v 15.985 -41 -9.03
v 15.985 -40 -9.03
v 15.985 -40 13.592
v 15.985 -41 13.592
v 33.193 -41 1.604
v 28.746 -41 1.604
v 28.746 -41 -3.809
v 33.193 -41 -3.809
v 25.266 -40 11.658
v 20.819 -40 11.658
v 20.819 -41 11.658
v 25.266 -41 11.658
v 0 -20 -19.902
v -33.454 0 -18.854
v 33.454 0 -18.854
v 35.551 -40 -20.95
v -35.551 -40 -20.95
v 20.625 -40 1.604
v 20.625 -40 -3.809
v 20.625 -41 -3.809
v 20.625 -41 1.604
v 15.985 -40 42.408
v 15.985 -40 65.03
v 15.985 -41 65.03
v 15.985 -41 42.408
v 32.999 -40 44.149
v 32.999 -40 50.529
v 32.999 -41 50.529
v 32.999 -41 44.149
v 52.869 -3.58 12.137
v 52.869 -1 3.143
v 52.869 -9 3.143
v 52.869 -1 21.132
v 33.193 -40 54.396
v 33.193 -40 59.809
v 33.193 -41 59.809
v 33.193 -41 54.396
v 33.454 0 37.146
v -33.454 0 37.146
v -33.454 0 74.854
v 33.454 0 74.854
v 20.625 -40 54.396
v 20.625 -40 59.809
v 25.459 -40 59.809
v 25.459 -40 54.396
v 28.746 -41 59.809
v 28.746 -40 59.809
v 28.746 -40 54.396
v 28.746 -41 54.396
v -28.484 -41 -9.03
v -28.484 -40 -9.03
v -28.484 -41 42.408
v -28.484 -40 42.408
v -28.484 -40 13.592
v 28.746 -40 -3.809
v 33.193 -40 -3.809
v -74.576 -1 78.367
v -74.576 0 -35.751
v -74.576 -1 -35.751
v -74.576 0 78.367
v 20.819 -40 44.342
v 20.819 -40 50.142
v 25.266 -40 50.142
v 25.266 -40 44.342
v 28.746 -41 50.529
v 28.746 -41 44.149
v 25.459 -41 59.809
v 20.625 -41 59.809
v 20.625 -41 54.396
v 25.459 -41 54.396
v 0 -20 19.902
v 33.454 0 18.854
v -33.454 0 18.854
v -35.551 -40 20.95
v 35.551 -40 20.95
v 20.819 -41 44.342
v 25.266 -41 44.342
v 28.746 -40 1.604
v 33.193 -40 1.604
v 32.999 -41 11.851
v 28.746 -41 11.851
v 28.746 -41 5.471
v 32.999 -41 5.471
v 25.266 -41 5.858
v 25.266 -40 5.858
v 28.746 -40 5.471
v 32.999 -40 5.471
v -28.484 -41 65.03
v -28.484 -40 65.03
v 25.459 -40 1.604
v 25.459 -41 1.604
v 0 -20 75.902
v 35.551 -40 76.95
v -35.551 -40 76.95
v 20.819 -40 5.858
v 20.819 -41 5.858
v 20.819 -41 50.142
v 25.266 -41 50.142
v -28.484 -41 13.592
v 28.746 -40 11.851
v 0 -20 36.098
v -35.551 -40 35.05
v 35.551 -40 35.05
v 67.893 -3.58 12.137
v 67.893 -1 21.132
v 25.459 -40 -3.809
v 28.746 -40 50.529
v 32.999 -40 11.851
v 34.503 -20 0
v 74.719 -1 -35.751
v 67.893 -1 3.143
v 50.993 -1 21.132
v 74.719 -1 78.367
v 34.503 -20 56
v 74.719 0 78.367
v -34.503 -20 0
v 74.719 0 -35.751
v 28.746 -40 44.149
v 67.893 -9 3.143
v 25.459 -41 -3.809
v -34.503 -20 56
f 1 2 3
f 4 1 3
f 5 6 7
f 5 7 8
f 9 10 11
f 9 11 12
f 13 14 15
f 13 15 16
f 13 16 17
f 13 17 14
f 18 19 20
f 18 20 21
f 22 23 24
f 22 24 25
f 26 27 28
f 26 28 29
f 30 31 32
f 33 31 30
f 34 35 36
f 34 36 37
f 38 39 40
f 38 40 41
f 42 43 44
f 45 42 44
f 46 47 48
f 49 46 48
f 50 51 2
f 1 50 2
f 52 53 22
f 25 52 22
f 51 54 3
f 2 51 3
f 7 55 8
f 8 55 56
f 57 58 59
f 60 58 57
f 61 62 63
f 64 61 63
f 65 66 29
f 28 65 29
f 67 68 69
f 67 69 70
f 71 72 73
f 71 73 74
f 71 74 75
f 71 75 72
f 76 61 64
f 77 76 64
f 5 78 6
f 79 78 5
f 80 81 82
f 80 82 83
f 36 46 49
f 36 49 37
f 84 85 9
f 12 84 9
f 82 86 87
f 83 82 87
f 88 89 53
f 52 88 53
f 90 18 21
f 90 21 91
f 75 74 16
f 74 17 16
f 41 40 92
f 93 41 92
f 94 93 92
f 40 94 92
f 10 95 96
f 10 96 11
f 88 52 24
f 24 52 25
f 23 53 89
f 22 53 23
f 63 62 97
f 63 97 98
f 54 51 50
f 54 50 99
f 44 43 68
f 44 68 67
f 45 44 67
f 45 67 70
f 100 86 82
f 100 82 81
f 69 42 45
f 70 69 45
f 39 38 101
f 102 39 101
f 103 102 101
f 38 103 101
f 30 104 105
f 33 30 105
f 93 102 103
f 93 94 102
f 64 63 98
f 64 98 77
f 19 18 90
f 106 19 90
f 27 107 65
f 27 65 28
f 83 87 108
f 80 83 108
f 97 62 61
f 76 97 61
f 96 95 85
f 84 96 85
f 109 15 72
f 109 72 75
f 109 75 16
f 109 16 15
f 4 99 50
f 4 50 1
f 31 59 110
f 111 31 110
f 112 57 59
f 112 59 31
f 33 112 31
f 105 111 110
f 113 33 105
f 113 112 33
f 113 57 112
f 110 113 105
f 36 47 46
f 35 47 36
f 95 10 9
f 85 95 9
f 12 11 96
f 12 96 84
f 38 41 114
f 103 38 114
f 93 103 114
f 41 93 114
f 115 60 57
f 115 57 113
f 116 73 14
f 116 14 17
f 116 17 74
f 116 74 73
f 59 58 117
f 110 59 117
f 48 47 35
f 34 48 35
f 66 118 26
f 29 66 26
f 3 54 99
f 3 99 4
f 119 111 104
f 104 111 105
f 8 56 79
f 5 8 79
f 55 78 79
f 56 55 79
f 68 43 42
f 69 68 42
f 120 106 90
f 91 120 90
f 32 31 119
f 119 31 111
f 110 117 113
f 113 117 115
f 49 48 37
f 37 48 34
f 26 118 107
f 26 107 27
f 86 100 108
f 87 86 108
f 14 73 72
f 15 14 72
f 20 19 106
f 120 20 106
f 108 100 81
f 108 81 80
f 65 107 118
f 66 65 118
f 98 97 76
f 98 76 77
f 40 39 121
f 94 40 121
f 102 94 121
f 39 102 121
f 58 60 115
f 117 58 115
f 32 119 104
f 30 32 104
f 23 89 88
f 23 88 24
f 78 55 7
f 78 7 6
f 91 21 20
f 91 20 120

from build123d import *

# Parameters (mm, degrees)
F0_W      = 66.9087618589
F0_H      = 37.7080328763
F1_DEPTH  = 40
F1_TAPER  = -3
F2_W      = 44.4693062454
F2_H      = 22.6213429123
F3_DEPTH  = 1
F2_W_2    = 4.4469255954
F2_H_2    = 5.8003440499
F2_W_3    = 4.2535867542
F2_H_3    = 6.3803782687
F2_W_4    = 4.8336200416
F2_H_4    = 5.4136546096
F2_W_5    = 4.446933046
F6_W      = 149.2954716086
F6_H      = 114.1182482243
F7_DEPTH  = 1
F8_W      = 15.024073422
F8_H      = 17.9893565364
F9_DEPTH  = 8
F11_DEPTH = 16.9


with BuildPart() as f1:
    # F0 (on Front) → F1 (new body)
    with BuildSketch(Plane.XZ):
        Rectangle(F0_W, F0_H)
    extrude(amount=F1_DEPTH, taper=F1_TAPER)


with BuildPart() as f3:
    # F2 (on face) → F3 (new body)
    with BuildSketch(Plane.XZ.offset(40)):
        with Locations((-6.2495721504, 2.280915156)):
            Rectangle(F2_W, F2_H)
    extrude(amount=F3_DEPTH)


with BuildPart() as f3b:
    # F2 (on face) → F3, piece 2 (new body)
    with BuildSketch(Plane.XZ.offset(40)):
        with Locations((23.0421656743, 8.7579656392)):
            Rectangle(F2_W_2, F2_H_2)
    extrude(amount=F3_DEPTH)


with BuildPart() as f3c:
    # F2 (on face) → F3, piece 3 (new body)
    with BuildSketch(Plane.XZ.offset(40)):
        with Locations((30.8726290241, 8.661292959)):
            Rectangle(F2_W_3, F2_H_3)
    extrude(amount=F3_DEPTH)


with BuildPart() as f3d:
    # F2 (on face) → F3, piece 4 (new body)
    with BuildSketch(Plane.XZ.offset(40)):
        with Locations((23.0421684682, -1.1026191642)):
            Rectangle(F2_W_4, F2_H_4)
    extrude(amount=F3_DEPTH)


with BuildPart() as f3e:
    # F2 (on face) → F3, piece 5 (new body)
    with BuildSketch(Plane.XZ.offset(40)):
        with Locations((30.96930217, -1.1026191642)):
            Rectangle(F2_W_5, F2_H_4)
    extrude(amount=F3_DEPTH)


with BuildPart() as f5_1:
    # F5: instance of F1
    add(f1.part.mirror(Plane.XY.offset(28)))


with BuildPart() as f5_2:
    # F5: instance of F3
    add(f3.part.mirror(Plane.XY.offset(28)))


with BuildPart() as f5_3:
    # F5: instance of F3b
    add(f3b.part.mirror(Plane.XY.offset(28)))


with BuildPart() as f5_4:
    # F5: instance of F3c
    add(f3c.part.mirror(Plane.XY.offset(28)))


with BuildPart() as f5_5:
    # F5: instance of F3d
    add(f3d.part.mirror(Plane.XY.offset(28)))


with BuildPart() as f5_6:
    # F5: instance of F3e
    add(f3e.part.mirror(Plane.XY.offset(28)))


with BuildPart() as f7:
    # F6 (on Front) → F7 (new body)
    with BuildSketch(Plane.XZ):
        with Locations((0.0716932118, 21.3082656264)):
            Rectangle(F6_W, F6_H)
    extrude(amount=F7_DEPTH)

    # F8 (on face) → F9 (join)
    with BuildSketch(Plane.XZ.offset(1)):
        with Locations((60.3805892169, 12.1372377034)):
            Rectangle(F8_W, F8_H)
    extrude(amount=F9_DEPTH)

    # F10 (on face) → F11 (cut)
    with BuildSketch(Plane.YZ.offset(67.8926259279)):
        Polygon((-3.5800645128, 12.1372377034), (-1, 21.1319159716), (-9, 21.1319159716), (-9, 3.1425594352), align=None)
    extrude(amount=-F11_DEPTH, mode=Mode.SUBTRACT)


solid = Compound([f1.part, f3.part, f3b.part, f3c.part, f3d.part, f3e.part, f5_1.part, f5_2.part, f5_3.part, f5_4.part, f5_5.part, f5_6.part, f7.part])
